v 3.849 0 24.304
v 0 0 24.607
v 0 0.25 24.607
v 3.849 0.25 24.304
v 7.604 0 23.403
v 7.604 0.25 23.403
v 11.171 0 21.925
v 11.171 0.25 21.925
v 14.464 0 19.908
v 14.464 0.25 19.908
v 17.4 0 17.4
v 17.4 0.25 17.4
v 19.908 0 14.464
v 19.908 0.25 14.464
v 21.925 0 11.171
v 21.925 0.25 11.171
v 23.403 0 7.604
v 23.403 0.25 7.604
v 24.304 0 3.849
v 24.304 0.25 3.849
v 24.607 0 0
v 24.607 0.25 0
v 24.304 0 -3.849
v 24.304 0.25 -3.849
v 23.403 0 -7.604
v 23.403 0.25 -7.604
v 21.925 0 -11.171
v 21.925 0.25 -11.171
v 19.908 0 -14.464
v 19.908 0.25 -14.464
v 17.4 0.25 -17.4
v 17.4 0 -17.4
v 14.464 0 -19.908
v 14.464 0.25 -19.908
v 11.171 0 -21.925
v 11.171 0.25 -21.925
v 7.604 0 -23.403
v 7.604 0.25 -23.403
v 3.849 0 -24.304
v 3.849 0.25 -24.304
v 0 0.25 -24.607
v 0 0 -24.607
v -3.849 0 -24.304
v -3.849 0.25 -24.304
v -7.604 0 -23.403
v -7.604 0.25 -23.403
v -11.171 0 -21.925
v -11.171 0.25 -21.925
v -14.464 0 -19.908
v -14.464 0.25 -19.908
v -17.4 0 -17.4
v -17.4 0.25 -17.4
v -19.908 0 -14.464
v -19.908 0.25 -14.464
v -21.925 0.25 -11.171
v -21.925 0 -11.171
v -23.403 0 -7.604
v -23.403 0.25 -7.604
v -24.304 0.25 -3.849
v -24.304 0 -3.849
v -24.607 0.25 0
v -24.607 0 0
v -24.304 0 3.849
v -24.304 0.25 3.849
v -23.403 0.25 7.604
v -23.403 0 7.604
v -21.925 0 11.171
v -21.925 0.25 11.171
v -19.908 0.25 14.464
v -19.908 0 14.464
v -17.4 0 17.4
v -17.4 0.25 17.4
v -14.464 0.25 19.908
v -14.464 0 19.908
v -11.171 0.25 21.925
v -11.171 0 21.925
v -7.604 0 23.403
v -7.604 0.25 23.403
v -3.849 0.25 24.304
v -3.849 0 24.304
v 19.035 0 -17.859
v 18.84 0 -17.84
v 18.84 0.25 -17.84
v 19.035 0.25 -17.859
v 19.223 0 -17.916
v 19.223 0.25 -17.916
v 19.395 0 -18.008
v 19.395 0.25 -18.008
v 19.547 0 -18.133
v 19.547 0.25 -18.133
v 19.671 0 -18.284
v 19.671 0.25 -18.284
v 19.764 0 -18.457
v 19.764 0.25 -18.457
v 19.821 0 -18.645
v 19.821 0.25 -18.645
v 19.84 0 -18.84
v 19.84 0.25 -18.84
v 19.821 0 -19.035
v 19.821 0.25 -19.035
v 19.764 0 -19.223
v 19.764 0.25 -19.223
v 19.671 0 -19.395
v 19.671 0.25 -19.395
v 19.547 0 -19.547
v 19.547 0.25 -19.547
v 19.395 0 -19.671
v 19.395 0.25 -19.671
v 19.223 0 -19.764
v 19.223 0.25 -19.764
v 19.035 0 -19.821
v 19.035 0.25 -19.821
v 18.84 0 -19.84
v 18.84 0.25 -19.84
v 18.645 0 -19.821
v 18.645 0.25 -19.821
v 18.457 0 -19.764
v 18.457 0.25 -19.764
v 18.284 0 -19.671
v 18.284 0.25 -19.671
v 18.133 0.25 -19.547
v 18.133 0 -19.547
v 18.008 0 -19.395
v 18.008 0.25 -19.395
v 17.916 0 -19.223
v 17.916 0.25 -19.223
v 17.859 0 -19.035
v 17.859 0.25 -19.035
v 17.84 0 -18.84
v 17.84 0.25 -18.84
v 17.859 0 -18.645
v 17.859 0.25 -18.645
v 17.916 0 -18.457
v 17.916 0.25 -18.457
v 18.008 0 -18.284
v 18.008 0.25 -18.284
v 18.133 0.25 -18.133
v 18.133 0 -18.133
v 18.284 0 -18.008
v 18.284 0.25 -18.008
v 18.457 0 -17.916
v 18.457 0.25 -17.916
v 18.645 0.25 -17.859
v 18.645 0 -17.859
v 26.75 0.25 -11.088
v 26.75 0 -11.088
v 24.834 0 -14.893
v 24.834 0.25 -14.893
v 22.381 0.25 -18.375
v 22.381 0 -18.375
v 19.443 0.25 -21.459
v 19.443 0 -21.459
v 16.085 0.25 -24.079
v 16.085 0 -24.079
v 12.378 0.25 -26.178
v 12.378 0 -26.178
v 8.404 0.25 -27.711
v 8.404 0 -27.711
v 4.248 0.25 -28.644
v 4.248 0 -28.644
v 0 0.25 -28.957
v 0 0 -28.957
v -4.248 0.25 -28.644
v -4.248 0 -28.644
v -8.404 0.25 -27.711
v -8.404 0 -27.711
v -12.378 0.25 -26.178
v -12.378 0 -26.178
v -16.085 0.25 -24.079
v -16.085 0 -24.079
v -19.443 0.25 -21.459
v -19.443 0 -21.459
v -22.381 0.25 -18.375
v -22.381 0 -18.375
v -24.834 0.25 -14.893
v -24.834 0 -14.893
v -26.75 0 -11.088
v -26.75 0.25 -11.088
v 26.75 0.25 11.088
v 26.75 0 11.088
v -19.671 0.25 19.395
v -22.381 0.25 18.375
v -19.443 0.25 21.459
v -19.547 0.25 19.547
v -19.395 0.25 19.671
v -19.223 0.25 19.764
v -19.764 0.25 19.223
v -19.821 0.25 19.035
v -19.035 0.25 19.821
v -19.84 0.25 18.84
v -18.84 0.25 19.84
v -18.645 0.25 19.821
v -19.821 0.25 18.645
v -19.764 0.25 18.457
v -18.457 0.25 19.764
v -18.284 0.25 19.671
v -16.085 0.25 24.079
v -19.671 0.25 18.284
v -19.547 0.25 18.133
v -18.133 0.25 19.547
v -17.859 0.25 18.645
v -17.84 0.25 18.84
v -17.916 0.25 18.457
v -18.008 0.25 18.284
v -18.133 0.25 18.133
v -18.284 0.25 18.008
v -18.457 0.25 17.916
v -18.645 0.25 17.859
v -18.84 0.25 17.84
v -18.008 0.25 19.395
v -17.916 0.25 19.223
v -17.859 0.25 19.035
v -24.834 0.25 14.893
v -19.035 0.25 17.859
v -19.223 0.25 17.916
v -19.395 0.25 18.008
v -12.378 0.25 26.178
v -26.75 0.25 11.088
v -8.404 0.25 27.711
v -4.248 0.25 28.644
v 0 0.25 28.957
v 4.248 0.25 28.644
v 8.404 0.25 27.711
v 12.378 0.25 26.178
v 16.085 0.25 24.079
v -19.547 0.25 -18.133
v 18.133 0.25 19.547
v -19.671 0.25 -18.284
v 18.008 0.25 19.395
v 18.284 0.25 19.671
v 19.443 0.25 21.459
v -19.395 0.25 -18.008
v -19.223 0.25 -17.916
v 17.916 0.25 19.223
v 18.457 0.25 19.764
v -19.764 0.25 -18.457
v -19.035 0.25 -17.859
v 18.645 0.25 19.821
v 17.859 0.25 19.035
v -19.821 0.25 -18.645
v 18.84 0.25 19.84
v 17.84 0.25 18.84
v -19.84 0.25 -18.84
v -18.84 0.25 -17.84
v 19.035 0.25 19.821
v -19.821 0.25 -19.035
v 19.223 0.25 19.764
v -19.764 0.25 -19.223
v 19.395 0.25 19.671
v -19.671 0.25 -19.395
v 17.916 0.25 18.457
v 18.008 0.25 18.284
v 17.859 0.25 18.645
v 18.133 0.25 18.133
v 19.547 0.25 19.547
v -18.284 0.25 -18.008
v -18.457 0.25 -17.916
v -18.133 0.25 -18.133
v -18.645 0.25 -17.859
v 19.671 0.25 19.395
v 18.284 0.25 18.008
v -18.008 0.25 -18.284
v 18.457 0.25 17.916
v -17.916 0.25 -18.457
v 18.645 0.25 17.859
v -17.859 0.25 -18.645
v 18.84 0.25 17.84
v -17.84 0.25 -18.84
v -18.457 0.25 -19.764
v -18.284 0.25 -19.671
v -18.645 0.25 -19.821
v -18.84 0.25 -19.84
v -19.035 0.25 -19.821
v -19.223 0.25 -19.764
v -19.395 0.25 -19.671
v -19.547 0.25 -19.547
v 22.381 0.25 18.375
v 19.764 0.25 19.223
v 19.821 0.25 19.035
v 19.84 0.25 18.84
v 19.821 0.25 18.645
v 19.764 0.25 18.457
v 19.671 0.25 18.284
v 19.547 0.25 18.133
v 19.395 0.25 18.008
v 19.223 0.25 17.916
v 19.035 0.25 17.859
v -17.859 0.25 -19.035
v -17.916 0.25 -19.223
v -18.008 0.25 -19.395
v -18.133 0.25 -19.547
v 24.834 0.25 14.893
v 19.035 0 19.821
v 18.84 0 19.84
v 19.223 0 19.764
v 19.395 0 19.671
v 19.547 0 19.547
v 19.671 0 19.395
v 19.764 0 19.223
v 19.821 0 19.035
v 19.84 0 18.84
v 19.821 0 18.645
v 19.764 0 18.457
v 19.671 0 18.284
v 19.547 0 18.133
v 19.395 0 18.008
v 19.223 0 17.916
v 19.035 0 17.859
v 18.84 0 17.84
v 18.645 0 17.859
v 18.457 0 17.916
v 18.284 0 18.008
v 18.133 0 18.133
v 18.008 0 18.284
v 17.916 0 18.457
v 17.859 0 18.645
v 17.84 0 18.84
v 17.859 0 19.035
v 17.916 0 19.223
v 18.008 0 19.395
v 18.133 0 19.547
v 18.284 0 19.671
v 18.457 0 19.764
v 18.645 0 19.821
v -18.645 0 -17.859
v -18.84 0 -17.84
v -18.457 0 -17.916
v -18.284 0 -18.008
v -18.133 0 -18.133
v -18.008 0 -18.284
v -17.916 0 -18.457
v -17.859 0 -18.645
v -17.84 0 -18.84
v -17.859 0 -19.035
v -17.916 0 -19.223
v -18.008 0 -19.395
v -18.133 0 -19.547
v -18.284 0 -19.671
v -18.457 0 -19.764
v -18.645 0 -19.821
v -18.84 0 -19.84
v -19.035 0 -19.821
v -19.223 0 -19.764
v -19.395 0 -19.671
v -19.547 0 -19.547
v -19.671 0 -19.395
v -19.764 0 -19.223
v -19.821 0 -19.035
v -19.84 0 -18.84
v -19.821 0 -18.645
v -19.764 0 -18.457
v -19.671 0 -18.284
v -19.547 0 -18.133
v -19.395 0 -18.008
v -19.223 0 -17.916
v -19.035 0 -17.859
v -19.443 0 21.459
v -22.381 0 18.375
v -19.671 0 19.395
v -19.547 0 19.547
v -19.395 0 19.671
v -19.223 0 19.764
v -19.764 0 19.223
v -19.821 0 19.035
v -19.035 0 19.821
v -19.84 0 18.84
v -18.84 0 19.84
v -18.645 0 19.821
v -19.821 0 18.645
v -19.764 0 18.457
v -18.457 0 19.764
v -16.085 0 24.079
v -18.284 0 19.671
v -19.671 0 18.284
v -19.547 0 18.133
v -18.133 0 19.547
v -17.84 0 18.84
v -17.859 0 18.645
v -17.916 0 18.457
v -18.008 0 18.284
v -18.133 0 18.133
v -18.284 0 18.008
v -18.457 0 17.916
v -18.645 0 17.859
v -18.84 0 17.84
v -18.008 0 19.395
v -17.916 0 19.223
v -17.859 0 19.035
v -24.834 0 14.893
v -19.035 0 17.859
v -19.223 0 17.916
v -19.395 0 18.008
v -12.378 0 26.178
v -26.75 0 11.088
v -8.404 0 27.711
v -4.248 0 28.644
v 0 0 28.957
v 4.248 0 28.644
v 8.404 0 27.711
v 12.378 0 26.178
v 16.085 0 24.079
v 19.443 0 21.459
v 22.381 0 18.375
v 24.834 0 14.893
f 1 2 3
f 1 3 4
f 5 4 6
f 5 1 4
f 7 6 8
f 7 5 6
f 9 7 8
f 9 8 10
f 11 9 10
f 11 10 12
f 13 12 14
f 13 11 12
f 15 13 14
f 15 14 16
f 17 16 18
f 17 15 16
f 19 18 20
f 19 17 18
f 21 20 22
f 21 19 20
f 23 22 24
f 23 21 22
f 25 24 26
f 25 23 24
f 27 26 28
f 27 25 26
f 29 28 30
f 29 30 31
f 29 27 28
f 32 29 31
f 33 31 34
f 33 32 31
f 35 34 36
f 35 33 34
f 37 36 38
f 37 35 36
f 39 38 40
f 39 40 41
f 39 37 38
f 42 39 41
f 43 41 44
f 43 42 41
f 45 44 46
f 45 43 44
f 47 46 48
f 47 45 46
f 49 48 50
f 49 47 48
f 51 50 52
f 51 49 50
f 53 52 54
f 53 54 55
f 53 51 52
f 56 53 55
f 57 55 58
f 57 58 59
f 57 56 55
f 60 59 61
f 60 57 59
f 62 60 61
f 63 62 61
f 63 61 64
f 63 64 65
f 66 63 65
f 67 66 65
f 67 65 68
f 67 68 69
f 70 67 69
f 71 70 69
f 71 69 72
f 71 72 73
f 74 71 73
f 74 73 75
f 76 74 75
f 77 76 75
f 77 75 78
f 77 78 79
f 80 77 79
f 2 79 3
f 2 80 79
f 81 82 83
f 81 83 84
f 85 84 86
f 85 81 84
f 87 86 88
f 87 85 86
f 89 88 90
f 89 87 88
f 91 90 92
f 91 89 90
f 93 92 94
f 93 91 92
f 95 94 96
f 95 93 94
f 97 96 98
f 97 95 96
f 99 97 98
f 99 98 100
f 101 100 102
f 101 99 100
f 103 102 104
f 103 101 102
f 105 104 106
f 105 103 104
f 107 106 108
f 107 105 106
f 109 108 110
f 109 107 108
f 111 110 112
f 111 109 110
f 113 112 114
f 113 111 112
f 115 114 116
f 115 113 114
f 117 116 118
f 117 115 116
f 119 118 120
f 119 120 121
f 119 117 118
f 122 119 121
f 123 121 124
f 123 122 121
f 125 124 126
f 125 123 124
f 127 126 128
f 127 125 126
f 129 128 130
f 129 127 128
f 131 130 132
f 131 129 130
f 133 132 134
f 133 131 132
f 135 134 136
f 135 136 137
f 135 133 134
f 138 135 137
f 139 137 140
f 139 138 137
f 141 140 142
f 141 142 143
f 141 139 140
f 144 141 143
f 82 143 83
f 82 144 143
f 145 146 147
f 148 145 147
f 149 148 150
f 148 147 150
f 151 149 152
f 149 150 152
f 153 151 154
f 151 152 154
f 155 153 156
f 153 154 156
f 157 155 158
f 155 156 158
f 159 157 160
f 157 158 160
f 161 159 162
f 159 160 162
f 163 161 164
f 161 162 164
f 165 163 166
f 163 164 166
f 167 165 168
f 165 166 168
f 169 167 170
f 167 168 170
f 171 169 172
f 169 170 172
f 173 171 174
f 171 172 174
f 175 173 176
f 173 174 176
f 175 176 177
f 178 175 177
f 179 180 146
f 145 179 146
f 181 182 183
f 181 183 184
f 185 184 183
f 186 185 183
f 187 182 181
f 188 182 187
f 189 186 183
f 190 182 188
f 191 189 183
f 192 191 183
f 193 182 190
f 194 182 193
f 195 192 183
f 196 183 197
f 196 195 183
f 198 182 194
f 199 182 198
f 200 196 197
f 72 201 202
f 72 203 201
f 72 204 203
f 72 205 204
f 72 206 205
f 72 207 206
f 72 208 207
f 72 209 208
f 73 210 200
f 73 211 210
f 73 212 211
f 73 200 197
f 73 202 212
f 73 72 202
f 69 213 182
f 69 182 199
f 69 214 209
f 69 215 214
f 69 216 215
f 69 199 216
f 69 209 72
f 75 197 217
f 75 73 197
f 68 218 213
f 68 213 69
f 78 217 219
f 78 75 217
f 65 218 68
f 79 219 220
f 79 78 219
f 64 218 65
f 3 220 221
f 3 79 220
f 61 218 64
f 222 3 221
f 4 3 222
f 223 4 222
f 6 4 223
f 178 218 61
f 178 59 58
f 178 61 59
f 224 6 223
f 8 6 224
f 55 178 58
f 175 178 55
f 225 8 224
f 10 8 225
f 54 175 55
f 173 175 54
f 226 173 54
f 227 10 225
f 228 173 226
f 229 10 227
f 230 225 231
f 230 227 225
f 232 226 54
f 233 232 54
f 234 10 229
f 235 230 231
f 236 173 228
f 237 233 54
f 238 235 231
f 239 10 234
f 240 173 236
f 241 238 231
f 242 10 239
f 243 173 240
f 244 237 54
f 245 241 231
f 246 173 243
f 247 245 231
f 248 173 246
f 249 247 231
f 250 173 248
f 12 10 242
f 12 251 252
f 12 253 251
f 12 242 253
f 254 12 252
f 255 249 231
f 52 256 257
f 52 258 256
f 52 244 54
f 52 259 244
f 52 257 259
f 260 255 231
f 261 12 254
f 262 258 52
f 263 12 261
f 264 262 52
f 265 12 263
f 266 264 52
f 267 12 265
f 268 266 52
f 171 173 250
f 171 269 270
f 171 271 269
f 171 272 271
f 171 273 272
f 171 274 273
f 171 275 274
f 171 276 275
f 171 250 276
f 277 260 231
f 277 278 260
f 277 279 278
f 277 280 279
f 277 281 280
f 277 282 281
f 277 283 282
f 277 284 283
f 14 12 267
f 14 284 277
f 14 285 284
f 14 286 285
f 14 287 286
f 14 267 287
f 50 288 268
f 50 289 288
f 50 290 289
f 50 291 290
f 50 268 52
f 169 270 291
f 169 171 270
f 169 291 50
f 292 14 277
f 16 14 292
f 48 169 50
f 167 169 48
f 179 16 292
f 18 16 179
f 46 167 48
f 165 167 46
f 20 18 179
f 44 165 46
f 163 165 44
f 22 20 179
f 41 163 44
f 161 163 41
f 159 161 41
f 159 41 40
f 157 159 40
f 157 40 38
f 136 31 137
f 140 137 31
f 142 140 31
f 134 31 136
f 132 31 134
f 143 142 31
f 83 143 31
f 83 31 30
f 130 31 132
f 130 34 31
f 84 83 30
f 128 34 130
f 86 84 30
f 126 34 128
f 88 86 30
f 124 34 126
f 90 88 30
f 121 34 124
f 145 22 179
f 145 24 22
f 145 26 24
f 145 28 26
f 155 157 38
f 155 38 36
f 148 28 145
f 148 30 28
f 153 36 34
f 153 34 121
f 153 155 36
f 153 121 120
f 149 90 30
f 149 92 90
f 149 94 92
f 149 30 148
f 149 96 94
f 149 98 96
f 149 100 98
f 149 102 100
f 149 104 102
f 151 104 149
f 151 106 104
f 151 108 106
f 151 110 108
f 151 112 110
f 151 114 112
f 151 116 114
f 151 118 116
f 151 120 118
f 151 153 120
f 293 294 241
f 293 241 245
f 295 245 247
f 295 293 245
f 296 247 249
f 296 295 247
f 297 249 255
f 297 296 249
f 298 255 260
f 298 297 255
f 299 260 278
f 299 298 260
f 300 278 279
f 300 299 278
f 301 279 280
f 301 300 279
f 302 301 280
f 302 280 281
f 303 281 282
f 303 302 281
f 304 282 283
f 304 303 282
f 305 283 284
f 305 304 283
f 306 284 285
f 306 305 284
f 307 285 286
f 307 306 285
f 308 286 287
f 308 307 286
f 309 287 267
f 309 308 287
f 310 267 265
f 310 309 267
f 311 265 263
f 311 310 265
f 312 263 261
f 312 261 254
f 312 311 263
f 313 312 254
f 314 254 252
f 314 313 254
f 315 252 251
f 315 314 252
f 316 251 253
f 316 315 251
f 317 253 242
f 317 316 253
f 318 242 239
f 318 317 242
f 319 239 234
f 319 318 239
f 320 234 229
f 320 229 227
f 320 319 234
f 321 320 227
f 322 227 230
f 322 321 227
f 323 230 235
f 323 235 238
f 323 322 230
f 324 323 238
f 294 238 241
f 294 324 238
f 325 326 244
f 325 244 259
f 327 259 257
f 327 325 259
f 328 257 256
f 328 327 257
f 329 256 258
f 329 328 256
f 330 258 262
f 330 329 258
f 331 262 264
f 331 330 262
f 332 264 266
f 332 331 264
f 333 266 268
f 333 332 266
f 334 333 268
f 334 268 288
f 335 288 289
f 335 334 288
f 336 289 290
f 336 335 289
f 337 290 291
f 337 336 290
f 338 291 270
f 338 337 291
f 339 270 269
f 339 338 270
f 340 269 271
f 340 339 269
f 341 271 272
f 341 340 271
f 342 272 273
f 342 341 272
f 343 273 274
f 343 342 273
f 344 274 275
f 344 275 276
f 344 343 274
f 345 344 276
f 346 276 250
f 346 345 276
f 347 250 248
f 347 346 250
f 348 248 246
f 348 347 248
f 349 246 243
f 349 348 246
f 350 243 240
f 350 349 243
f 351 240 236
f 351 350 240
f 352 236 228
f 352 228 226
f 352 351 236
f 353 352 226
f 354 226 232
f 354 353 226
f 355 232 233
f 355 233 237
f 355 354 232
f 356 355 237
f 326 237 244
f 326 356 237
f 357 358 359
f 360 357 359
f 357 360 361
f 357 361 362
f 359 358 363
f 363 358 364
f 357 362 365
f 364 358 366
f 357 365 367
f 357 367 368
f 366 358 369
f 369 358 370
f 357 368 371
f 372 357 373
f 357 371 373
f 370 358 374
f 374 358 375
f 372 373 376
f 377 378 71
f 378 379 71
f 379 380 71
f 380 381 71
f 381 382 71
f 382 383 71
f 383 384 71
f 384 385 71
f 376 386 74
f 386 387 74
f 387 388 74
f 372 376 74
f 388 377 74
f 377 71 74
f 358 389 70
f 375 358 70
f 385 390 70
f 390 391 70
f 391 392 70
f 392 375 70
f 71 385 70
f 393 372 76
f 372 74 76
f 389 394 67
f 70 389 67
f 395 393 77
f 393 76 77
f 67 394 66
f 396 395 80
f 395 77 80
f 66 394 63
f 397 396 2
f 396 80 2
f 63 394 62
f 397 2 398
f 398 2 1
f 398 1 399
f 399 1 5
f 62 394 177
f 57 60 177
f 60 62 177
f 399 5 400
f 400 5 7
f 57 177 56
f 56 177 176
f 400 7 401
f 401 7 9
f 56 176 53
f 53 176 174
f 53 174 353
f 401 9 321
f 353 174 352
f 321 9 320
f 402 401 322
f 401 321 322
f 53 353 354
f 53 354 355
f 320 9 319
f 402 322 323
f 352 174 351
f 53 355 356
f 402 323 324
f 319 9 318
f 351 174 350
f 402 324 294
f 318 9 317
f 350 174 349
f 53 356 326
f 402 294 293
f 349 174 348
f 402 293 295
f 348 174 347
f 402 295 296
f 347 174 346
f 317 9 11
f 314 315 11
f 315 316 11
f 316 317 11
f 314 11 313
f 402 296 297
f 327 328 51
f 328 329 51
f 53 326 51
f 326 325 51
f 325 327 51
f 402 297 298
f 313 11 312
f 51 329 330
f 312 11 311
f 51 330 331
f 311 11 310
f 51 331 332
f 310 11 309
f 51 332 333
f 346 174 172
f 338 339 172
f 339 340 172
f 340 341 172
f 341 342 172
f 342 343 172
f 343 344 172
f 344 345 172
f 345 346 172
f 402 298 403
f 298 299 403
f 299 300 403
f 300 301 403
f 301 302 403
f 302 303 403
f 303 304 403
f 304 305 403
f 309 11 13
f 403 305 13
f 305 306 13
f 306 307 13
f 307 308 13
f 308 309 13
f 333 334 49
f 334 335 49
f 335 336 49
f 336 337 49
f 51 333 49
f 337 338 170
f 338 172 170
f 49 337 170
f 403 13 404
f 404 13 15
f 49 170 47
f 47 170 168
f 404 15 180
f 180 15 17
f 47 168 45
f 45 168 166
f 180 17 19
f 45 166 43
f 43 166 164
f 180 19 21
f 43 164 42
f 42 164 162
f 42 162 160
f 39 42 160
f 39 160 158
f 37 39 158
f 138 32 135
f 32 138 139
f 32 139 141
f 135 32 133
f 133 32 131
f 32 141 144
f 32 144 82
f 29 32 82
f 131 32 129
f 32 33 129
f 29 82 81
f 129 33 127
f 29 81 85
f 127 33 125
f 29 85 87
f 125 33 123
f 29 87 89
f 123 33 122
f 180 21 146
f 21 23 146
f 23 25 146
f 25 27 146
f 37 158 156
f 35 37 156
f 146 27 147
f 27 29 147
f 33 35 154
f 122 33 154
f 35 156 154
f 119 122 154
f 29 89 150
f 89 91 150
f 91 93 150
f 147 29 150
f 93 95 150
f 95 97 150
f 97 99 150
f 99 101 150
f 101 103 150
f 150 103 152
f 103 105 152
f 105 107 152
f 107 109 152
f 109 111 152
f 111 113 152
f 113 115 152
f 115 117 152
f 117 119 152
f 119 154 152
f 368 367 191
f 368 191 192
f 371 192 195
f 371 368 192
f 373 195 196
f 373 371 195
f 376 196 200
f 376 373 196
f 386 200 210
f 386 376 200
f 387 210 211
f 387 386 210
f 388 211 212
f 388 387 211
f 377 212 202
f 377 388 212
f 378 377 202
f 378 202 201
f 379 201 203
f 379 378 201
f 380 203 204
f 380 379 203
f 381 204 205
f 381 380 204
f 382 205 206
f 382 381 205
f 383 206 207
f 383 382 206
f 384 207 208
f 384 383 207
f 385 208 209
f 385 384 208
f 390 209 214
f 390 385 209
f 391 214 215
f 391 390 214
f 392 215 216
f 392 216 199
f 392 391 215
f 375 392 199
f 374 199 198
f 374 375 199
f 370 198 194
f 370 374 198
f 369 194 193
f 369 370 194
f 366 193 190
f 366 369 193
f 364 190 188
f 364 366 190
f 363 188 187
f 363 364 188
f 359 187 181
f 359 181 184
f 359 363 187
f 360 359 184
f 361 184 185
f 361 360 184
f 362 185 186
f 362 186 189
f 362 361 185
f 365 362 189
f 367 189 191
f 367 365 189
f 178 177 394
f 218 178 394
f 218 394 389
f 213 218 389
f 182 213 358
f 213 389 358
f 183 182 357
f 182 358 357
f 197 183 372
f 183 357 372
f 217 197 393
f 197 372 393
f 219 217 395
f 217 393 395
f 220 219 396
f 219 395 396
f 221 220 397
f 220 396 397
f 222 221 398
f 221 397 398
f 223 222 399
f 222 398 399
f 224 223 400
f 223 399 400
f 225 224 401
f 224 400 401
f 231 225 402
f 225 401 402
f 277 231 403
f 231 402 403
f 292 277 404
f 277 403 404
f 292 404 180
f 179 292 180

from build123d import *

# Parameters (mm, degrees)
SKETCH1_R           = 1
SKETCH1_R_2         = 24.607140245
BOSS_EXTRUDE1_DEPTH = 0.25


with BuildPart() as part:
    # Sketch1 → Boss-Extrude1 (new body)
    with BuildSketch(Plane(origin=(0, 0, 0), x_dir=(1, 0, 0), z_dir=(0, 1, 0))):
        with BuildLine():
            Line((-26.75, 11.088438625), (-26.75, -11.088438625))
            ThreePointArc((-26.75, -11.088438625), (0, -28.957140245), (26.75, -11.088438625))
            Line((26.75, -11.088438625), (26.75, 11.088438625))
            ThreePointArc((26.75, 11.088438625), (0, 28.957140245), (-26.75, 11.088438625))
        make_face()
        with Locations(Location((18.839877725, -18.839877725, 0), (0, 0, 270))):
            Circle(SKETCH1_R, mode=Mode.SUBTRACT)
        with Locations(Location((18.839877725, 18.839877725, 0), (0, 0, 270))):
            Circle(SKETCH1_R, mode=Mode.SUBTRACT)
        with Locations(Location((-18.839877725, 18.839877725, 0), (0, 0, 270))):
            Circle(SKETCH1_R, mode=Mode.SUBTRACT)
        with Locations(Location((-18.839877725, -18.839877725, 0), (0, 0, 270))):
            Circle(SKETCH1_R, mode=Mode.SUBTRACT)
        with Locations(Location((0, 0, 0), (0, 0, 270))):
            Circle(SKETCH1_R_2, mode=Mode.SUBTRACT)
    extrude(amount=BOSS_EXTRUDE1_DEPTH)


solid = part.part
